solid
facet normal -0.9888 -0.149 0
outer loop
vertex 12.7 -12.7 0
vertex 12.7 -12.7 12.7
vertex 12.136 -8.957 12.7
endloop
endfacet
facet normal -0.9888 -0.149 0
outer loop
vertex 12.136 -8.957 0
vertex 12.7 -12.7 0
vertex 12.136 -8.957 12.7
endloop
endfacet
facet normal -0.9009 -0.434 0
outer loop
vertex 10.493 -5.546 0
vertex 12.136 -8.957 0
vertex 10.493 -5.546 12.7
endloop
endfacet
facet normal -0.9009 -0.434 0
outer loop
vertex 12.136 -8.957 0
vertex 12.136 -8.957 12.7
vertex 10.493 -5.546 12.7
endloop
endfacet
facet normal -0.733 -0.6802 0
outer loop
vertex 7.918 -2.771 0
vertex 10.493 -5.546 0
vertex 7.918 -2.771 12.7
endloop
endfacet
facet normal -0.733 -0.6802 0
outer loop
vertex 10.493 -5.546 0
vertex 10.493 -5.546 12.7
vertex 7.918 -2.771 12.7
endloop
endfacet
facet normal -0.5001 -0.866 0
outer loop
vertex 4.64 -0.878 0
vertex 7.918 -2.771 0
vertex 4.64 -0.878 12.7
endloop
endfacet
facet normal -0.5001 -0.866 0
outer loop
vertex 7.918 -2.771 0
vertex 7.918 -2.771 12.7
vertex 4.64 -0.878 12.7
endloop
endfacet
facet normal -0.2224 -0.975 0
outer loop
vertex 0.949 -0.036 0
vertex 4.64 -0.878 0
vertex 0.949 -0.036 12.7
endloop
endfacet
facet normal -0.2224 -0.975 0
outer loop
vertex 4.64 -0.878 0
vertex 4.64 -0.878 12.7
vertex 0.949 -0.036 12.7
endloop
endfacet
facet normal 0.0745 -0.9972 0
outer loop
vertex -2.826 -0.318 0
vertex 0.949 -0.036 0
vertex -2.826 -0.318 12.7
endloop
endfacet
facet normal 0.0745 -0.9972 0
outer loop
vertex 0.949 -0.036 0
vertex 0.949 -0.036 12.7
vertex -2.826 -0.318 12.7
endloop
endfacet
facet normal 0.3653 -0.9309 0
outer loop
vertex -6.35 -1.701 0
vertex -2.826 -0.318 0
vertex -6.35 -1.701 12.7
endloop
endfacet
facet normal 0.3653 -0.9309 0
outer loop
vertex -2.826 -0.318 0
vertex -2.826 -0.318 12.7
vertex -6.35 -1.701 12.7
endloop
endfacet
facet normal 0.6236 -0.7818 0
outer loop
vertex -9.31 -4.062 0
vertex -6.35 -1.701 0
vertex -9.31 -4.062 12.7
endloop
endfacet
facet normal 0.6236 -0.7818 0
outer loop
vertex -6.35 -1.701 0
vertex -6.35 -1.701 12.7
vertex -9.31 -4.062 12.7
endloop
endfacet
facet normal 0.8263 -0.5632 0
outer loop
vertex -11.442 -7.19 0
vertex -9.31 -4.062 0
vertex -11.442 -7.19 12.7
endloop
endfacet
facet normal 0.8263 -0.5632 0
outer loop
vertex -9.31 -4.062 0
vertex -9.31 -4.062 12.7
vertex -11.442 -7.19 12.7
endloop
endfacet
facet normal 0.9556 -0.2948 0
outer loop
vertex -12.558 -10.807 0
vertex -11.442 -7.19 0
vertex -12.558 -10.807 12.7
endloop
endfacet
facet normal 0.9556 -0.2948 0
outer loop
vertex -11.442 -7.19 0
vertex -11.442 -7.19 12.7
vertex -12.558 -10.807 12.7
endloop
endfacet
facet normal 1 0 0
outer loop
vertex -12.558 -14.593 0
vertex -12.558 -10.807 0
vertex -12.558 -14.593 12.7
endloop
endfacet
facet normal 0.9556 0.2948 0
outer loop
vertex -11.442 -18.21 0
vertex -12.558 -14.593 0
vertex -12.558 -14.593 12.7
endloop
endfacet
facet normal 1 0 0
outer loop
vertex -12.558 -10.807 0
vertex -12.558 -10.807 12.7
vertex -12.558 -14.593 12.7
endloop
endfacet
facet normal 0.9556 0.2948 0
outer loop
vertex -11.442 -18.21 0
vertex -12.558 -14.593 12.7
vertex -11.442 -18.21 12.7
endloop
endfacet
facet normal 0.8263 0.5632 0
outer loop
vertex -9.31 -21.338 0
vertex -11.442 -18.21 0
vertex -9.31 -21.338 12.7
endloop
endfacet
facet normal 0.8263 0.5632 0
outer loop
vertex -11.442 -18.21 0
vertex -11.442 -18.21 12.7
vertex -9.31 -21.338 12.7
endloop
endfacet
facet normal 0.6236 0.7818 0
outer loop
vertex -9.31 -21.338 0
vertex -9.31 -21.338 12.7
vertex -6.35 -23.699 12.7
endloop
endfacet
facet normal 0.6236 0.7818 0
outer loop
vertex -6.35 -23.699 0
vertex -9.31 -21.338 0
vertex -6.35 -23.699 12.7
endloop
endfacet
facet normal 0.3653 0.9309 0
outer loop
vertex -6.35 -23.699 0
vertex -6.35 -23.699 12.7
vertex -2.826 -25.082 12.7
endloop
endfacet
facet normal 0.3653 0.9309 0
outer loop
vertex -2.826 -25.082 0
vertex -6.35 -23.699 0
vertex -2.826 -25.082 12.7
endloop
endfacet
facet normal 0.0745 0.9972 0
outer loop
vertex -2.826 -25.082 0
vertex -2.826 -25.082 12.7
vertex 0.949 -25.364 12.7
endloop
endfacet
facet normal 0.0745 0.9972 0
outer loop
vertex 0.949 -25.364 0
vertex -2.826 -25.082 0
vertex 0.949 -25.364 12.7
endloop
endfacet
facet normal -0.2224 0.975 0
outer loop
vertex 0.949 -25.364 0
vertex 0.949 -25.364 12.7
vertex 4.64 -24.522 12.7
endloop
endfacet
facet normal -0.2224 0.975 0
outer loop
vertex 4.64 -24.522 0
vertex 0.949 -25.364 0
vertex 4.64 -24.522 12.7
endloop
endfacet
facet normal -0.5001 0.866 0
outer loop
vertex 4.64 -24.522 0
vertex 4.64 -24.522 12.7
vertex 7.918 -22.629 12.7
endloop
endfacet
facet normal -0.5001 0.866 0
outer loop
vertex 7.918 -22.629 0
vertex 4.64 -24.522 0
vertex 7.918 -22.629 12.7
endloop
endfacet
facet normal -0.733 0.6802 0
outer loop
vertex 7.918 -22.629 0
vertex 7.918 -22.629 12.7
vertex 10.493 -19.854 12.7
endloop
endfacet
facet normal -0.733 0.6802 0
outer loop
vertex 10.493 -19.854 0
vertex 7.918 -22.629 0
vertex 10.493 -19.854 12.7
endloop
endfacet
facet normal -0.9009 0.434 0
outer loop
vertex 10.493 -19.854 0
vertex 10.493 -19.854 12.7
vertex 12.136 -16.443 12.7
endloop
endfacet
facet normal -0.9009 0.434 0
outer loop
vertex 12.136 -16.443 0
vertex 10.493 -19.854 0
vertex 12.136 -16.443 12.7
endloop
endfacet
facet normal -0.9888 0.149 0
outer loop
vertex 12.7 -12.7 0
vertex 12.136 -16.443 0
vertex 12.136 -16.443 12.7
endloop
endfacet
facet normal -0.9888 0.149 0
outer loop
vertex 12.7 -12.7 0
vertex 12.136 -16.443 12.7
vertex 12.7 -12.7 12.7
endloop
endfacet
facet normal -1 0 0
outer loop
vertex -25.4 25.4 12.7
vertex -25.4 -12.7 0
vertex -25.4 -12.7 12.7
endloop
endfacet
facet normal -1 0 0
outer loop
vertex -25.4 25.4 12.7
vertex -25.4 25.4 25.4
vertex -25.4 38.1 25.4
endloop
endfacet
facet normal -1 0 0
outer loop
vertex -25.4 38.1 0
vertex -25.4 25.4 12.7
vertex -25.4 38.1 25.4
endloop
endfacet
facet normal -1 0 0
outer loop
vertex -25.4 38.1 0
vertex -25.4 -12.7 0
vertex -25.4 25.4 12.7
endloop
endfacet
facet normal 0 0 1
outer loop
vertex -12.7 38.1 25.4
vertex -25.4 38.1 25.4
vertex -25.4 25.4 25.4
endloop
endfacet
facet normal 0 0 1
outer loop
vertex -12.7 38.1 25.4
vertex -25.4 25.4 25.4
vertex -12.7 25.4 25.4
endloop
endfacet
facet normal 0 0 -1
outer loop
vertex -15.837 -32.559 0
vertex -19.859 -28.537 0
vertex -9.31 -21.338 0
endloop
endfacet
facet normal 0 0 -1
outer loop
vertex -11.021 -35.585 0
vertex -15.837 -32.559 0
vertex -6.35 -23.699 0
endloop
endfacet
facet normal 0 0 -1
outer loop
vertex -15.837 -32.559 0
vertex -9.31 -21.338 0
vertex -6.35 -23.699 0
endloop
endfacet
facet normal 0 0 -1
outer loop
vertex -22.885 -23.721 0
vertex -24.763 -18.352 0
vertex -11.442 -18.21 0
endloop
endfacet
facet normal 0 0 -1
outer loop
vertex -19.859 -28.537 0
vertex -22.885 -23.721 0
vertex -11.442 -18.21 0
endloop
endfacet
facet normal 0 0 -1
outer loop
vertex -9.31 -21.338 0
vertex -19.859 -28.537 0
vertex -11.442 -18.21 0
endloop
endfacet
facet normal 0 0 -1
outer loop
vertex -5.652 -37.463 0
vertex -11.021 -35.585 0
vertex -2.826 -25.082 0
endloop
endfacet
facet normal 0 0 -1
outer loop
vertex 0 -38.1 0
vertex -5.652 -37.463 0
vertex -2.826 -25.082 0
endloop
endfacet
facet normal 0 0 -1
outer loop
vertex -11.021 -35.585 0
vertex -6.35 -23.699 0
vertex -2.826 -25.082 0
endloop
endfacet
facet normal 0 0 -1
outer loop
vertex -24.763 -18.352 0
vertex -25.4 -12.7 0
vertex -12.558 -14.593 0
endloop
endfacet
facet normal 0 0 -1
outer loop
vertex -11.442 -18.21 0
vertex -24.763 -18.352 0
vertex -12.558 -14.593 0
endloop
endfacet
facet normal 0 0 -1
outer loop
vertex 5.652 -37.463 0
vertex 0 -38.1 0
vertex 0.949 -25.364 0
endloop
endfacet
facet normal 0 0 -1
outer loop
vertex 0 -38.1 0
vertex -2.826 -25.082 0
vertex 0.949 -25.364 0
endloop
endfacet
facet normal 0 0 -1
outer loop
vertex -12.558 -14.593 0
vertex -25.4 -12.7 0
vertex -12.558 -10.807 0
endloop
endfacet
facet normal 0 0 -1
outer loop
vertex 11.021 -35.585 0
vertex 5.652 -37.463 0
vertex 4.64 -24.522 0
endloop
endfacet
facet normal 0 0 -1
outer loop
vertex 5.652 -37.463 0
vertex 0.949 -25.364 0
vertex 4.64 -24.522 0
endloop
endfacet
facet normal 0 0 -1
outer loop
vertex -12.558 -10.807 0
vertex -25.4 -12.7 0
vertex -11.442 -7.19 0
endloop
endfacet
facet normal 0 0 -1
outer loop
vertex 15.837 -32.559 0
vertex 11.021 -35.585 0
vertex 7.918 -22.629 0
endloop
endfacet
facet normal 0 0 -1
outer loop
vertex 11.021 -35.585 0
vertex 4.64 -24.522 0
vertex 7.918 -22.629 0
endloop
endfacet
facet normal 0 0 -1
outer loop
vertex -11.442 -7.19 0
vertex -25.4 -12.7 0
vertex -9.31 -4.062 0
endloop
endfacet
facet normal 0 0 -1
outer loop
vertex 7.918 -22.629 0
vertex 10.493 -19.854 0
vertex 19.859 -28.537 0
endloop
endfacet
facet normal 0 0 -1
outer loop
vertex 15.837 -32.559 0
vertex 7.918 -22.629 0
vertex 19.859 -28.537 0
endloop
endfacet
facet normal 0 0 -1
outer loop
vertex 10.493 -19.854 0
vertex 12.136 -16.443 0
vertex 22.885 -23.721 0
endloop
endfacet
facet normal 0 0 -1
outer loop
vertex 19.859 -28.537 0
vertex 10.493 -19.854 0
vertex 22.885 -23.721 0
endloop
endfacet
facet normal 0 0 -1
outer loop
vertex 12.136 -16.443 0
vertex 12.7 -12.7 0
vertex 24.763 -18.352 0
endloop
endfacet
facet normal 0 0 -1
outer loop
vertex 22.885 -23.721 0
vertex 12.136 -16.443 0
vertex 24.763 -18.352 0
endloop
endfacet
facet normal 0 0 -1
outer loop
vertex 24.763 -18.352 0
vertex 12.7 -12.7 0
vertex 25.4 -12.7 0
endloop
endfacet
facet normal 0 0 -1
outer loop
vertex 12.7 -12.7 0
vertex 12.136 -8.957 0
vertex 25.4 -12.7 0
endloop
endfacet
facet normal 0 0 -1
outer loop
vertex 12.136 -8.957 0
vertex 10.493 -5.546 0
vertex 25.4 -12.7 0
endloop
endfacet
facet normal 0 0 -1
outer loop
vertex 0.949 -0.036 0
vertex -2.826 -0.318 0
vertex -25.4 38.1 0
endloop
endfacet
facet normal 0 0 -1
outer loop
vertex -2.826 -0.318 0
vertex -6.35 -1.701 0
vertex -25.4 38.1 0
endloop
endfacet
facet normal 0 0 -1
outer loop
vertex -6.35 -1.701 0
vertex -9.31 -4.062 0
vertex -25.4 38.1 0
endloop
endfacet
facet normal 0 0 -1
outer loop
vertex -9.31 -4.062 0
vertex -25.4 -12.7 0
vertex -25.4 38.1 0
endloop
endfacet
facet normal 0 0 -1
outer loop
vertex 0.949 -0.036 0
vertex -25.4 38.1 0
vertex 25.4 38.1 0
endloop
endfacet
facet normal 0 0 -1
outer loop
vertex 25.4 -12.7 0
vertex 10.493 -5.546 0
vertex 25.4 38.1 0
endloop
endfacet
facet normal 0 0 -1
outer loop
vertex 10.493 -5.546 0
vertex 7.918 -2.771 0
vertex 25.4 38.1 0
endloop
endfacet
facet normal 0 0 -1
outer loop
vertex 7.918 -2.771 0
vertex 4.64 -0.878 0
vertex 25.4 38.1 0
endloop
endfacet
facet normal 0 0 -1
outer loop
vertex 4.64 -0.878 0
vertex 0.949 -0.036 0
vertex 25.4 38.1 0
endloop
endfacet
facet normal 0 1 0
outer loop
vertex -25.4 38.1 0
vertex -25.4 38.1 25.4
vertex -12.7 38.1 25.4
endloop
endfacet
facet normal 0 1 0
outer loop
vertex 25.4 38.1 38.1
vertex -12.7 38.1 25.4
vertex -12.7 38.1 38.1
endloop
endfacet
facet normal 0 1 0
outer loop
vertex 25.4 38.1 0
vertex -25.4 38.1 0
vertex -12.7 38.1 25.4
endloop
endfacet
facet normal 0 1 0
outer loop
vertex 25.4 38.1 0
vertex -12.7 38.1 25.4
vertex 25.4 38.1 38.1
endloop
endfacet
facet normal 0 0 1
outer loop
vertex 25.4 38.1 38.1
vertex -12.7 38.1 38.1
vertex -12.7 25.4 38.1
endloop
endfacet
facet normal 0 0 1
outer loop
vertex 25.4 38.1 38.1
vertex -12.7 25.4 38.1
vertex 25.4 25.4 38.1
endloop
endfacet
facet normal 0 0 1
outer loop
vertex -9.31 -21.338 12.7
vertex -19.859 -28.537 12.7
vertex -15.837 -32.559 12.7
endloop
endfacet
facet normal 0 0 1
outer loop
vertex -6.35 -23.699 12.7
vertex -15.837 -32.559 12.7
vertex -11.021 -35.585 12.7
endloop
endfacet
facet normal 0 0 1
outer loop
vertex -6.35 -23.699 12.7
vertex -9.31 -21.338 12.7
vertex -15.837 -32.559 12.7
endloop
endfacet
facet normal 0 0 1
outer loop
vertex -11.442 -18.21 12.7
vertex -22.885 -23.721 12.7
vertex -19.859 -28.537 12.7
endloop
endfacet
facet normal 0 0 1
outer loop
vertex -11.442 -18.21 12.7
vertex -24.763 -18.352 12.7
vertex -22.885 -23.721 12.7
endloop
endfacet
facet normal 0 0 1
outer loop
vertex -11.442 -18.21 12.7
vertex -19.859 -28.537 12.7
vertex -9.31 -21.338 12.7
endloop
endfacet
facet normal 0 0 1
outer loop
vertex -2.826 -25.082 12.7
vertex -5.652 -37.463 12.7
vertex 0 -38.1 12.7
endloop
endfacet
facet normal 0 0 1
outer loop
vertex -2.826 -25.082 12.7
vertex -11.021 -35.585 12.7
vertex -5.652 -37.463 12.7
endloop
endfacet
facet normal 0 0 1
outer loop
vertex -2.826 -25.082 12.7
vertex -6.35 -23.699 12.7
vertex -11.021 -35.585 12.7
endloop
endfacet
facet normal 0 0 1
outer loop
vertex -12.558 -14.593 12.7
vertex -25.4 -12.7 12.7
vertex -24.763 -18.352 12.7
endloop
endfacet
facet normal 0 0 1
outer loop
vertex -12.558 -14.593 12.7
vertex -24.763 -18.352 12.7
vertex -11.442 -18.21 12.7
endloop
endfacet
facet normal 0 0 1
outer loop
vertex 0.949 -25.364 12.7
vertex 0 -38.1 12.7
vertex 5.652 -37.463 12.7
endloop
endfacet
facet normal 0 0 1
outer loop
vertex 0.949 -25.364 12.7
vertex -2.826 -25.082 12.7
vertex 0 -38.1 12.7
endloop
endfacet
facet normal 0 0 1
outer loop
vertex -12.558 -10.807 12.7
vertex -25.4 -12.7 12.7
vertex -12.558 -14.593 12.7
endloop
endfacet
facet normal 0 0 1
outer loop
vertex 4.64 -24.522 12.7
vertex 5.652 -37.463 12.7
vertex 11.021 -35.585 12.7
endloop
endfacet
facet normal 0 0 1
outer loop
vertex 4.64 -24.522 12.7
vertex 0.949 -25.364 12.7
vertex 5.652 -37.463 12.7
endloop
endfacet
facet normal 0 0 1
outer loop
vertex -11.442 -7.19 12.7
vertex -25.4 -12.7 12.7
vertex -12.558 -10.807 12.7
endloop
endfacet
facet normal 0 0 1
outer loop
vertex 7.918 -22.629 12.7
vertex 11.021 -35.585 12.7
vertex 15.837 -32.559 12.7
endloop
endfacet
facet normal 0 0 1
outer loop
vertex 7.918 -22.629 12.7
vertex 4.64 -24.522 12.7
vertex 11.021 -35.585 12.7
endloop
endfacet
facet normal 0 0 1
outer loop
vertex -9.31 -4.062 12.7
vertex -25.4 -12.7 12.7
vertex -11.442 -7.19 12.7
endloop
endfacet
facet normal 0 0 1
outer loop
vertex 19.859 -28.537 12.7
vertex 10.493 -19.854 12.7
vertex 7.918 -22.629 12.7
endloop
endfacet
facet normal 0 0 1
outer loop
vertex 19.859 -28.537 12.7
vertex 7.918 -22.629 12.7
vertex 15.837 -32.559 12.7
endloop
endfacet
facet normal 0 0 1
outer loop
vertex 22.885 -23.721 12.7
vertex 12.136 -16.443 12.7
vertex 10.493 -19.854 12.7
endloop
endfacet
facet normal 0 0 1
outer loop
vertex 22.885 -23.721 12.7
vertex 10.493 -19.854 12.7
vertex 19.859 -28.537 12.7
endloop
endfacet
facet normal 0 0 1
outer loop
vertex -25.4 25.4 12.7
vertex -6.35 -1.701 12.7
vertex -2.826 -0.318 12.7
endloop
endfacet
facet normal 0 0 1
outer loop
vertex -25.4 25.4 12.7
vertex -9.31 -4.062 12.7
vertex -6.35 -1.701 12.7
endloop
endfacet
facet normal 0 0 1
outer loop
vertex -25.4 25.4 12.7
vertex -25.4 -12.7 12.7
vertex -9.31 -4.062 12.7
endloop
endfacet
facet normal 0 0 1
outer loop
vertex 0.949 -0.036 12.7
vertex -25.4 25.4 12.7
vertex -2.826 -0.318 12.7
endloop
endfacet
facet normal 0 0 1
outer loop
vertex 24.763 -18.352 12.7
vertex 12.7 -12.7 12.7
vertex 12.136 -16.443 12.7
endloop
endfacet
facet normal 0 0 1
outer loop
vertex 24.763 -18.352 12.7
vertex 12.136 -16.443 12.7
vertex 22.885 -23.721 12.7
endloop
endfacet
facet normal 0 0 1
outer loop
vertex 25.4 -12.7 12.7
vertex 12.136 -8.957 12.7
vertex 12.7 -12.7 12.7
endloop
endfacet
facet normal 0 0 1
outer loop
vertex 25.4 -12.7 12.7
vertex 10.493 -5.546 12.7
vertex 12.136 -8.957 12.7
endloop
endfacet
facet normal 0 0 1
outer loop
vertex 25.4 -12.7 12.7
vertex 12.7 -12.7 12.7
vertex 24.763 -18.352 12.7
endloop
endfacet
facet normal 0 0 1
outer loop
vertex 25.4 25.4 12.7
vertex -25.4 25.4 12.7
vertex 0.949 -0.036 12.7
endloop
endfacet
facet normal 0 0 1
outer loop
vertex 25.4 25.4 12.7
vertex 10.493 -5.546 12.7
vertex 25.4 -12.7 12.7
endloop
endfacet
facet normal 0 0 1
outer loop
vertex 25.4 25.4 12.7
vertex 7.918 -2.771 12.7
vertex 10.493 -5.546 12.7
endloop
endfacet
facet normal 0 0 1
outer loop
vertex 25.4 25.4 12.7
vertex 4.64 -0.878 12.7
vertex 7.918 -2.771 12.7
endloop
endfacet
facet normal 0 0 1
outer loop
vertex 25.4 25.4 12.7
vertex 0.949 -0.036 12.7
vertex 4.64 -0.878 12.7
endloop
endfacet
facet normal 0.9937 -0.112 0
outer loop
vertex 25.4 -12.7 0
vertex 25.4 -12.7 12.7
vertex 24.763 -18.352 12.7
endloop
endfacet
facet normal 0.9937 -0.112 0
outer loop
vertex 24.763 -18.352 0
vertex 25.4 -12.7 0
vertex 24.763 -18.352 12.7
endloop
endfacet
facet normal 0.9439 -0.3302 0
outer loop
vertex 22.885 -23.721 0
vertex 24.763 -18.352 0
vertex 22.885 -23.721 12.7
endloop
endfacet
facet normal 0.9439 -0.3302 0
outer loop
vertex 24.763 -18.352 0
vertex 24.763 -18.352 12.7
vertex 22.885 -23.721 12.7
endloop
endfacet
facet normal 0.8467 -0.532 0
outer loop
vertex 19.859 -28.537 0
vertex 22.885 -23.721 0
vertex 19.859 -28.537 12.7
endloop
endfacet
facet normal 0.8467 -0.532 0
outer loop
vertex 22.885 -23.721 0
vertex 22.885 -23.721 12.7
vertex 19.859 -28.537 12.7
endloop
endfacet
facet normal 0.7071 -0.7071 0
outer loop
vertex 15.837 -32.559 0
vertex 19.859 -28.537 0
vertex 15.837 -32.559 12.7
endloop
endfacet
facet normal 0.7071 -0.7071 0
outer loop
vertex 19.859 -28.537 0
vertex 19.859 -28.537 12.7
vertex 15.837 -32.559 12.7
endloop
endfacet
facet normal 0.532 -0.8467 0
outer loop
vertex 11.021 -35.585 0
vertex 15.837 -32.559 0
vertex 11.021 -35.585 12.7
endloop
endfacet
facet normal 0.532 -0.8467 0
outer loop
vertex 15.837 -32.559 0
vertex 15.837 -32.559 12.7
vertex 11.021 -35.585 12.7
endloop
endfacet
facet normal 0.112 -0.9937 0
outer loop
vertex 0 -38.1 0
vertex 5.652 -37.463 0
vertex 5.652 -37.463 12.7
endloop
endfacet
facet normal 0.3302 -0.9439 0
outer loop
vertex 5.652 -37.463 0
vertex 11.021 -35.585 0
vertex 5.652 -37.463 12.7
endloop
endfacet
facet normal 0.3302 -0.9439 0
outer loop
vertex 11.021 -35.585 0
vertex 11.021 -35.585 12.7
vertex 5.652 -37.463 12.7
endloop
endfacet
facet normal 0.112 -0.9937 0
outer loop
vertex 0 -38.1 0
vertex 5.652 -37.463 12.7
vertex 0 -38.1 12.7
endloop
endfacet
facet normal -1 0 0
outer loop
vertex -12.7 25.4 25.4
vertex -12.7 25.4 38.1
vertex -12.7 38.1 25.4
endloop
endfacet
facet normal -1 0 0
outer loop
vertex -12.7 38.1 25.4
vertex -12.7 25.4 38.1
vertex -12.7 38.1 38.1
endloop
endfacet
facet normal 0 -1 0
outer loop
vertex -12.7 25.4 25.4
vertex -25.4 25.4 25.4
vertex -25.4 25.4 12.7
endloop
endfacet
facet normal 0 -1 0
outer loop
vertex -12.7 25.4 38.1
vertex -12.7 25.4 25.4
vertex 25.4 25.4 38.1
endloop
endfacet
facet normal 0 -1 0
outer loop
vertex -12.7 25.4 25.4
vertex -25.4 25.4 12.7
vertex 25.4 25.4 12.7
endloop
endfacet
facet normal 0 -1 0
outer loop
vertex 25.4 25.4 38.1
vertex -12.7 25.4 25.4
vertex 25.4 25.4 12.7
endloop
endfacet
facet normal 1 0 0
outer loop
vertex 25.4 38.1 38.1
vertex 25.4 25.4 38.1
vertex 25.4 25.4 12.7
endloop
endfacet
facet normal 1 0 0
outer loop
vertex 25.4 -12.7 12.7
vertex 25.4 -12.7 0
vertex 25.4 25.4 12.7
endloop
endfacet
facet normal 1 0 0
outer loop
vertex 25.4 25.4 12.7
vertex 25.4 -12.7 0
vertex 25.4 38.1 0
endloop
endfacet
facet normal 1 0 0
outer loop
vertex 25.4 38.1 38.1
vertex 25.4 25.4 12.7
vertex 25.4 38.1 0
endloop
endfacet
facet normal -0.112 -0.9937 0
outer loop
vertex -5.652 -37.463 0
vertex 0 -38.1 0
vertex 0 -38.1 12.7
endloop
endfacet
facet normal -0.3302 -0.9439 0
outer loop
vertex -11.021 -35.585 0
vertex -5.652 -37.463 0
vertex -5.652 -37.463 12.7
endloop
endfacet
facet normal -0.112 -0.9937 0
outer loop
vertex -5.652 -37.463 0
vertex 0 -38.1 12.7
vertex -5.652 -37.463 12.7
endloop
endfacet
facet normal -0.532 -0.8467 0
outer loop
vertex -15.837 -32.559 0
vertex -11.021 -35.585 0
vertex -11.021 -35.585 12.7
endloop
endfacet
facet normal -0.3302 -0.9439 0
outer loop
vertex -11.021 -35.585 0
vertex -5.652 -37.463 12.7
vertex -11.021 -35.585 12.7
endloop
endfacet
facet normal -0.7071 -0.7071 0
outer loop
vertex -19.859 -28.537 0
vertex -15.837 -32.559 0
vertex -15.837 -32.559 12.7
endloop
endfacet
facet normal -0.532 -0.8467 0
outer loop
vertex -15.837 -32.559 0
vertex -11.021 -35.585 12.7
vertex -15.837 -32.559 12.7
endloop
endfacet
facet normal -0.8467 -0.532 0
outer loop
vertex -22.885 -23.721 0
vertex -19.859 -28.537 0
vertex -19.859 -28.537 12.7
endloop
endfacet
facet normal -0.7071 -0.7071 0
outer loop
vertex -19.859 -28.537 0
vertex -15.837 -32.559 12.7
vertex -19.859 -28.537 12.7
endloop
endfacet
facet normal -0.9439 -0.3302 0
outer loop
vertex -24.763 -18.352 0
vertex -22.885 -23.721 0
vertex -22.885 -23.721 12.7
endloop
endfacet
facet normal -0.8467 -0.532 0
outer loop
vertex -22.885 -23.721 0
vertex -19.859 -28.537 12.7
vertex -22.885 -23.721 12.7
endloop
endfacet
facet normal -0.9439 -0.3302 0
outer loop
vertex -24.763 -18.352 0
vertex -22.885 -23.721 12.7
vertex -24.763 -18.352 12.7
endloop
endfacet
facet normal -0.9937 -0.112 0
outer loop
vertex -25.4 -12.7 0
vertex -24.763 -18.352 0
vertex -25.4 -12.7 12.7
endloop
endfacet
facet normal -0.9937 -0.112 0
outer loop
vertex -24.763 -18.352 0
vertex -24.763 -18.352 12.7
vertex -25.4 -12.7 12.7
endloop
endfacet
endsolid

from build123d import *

# Parameters (mm, degrees)
F0_W     = 50.8
F0_H     = 76.2
F1_DEPTH = 12.7
F2_W     = 50.8
F2_H     = 12.7
F3_DEPTH = 25.4
F4_W     = 12.7
F4_H     = 12.7
F5_DEPTH = 12.7
F6_R     = 12.7
F7_DEPTH = 12.701


with BuildPart() as f1:
    # F0 (on Top) → F1 (new body)
    with BuildSketch(Plane.XY):
        Rectangle(F0_W, F0_H)
    extrude(amount=F1_DEPTH)

    # F2 (on face) → F3 (join)
    with BuildSketch(Plane.XY.offset(12.7)):
        with Locations((0, 31.75)):
            Rectangle(F2_W, F2_H)
    extrude(amount=F3_DEPTH)

    # F4 (on face) → F5 (cut)
    with BuildSketch(Plane.XY.offset(38.1)):
        with Locations((-19.05, 31.75)):
            Rectangle(F4_W, F4_H)
    extrude(amount=-F5_DEPTH, mode=Mode.SUBTRACT)

    # F6 (on face) → F7 (cut, through all)
    with BuildSketch(Plane.XY.offset(12.7)):
        with Locations((0, -12.7)):
            Circle(F6_R)
        with BuildLine():
            ThreePointArc((-2.54e-08, -38.1), (-17.9605122511, -30.6605122332), (-25.4, -12.7))
            Line((-25.4, -12.7), (-25.4, -38.1))
            Line((-25.4, -38.1), (-2.54e-08, -38.1))
        make_face()
        with BuildLine():
            ThreePointArc((25.4, -12.7), (17.9605122332, -30.6605122511), (-2.54e-08, -38.1))
            Line((-2.54e-08, -38.1), (25.4, -38.1))
            Line((25.4, -38.1), (25.4, -12.7))
        make_face()
    extrude(amount=-F7_DEPTH, mode=Mode.SUBTRACT)


solid = f1.part
